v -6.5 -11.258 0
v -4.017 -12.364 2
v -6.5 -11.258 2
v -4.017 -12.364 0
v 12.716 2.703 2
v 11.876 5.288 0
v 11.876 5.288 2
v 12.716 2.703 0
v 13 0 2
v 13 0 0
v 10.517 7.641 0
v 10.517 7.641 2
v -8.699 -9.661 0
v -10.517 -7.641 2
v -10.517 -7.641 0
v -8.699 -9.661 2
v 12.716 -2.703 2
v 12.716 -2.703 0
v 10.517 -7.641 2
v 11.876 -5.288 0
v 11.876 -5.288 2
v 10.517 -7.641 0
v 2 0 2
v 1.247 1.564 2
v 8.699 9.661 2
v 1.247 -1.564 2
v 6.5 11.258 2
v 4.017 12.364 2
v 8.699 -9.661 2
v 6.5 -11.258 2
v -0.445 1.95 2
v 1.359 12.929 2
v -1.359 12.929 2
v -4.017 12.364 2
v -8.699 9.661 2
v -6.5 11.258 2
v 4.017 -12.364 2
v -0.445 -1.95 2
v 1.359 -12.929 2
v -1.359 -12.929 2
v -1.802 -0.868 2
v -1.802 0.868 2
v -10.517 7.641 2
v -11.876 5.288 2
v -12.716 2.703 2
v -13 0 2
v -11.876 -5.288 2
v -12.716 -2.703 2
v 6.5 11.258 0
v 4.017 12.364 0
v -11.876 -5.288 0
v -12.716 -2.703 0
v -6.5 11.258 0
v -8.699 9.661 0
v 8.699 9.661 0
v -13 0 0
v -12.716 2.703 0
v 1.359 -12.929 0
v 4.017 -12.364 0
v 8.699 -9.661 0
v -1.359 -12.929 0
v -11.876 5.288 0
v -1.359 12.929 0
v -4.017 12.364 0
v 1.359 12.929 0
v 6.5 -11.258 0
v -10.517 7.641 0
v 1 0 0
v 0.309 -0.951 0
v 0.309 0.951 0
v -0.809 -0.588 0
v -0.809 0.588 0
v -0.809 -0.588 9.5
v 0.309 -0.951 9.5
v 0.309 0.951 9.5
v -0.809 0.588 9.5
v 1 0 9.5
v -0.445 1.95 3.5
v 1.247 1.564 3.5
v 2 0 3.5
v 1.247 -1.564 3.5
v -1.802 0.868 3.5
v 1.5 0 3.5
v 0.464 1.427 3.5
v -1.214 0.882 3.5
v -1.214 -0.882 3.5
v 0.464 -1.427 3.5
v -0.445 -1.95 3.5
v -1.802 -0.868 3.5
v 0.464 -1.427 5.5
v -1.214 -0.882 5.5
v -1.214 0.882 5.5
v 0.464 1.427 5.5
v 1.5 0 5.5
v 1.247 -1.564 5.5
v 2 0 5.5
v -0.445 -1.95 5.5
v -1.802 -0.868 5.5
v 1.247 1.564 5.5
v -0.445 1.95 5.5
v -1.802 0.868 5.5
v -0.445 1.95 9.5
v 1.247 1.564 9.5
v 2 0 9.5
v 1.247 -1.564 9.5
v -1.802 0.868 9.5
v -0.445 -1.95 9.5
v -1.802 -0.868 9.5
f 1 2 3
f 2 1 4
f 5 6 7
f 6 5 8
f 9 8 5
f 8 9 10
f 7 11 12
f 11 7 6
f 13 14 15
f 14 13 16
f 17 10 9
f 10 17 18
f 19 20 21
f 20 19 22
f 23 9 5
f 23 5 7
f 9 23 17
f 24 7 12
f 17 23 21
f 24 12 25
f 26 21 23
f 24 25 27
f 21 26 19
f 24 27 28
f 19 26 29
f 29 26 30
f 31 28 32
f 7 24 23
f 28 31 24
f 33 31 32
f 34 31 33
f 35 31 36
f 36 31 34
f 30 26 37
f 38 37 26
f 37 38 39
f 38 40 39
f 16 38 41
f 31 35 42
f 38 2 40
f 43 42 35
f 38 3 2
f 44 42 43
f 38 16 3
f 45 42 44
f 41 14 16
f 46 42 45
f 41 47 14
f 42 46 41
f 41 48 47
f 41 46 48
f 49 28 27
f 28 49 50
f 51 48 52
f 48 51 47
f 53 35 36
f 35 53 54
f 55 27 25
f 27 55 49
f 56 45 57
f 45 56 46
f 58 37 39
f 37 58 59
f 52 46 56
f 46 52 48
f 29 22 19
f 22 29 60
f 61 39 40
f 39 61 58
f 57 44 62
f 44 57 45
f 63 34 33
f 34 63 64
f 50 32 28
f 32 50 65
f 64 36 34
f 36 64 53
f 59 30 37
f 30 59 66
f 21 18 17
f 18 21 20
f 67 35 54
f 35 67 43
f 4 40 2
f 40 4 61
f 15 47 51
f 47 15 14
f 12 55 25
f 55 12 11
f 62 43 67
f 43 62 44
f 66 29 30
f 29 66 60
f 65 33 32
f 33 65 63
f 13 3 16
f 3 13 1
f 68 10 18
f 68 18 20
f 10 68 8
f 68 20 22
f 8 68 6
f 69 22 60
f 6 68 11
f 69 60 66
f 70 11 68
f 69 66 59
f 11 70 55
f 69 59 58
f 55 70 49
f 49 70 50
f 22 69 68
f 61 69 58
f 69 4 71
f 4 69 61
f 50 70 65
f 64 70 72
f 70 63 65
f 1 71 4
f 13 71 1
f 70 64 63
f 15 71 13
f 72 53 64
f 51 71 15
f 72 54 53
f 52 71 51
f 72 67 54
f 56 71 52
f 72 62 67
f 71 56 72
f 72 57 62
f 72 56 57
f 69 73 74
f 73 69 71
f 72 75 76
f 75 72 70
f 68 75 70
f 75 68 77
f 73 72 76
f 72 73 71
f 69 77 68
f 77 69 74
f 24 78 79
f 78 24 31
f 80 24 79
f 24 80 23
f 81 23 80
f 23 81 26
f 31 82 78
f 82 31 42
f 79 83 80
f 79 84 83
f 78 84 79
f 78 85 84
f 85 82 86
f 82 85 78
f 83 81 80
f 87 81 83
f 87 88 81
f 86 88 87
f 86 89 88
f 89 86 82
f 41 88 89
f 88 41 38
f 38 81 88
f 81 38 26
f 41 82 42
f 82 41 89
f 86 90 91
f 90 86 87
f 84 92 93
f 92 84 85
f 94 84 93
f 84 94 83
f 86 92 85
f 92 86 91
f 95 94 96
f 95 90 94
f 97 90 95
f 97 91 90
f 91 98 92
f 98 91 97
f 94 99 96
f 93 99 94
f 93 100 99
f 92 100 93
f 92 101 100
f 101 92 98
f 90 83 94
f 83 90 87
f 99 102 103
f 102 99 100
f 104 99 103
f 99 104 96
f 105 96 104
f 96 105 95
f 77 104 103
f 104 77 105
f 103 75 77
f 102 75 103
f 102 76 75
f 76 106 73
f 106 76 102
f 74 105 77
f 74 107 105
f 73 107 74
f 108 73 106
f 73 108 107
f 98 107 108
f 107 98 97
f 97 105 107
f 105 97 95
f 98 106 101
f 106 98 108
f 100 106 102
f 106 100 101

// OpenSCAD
// -----------------------------------------------------------------------------
// Module: pipe
// -----------------------------------------------------------------------------
module pipe(R, r, L) {
    difference() {
        cylinder(h = L, r = R);
        translate([0, 0, -1])
        cylinder(h = L + 2, r = r);
    }
}

outer_r = 145;
inner_r = 140;

thickness = outer_r - inner_r; 
//gap = 0.1;
chink = inner_r * 2 /13 ;

// Piston specs
head_r = inner_r; // - gap; // Slight clearance
head_l = 2 * chink;
stroke = head_l;
axe = 4 * chink; // roulement a bille horisontale (2) + 1 unité de chaque coté
bielle_l = stroke * 2 + axe;

//cylinder_height = 60;

// -----------------------------------------------------------------------------
// Module: Half-Open Cylinder with Offset Wall
// -----------------------------------------------------------------------------
module half_open_cylinder(height, outer_r, inner_r) {
    translate_z = thickness; 
    difference() {
        cylinder(h = height, r = outer_r);
        translate([0, 0, translate_z]);
        cylinder(h = height, r = inner_r);
        
    }
}


// Base module defining dimensions relative to chink
module manson_13_base(chink) {
    head_r = 13 * chink;	
    head_l = 2 * chink;
    rod_l_head = (2 - 0.5) * chink;		
    neck_l = 2 * chink;
    neck_r = 1.5 * chink;
    rod_l_tail = 4 * chink;
    rod_r = 2 * chink;

    translate([0, 0, 0])
    pipe(head_r, chink, head_l);
    translate([0, 0, head_l])
    pipe(rod_r, chink, rod_l_head);
    translate([0, 0, head_l + rod_l_head])
    pipe(neck_r, chink, rod_l_tail);
    rod_z_start = head_l + rod_l_head + neck_l;
    translate([0, 0, rod_z_start])
    pipe(rod_r, chink, rod_l_tail);
}

// Base module defining dimensions relative to chink
module manson_13_base(chink) {
    head_r = 13 * chink;
    head_l = 2 * chink;
    rod_l_head = (2 - 0.5) * chink;
    neck_l = 2 * chink;
    neck_r = 1.5 * chink;
    rod_l_tail = 4 * chink;
    rod_r = 2 * chink;

    translate([0, 0, 0])
    pipe(head_r, chink, head_l);
    translate([0, 0, head_l])
    pipe(rod_r, chink, rod_l_head);
    translate([0, 0, head_l + rod_l_head])
    pipe(neck_r, chink, neck_l);
    rod_z_start = head_l + rod_l_head + neck_l;
    translate([0, 0, rod_z_start])
    pipe(rod_r, chink, rod_l_tail);
}

// Module pour l'axe perpendiculaire
module cylinder_axis(chink) {
    axis_r = chink; // Rayon = chink (Diamètre = 2 * chink)
    axis_l = 2 * chink; // Longueur de l'axe
    
    // Calcul de la position Z demandée
    // Note: rod_z_start doit être recalculé ici car il est local au module base
    head_l = 2 * chink;
    rod_l_head = (2 - 0.5) * chink;
    neck_l = 2 * chink;
    rod_z_start = head_l + rod_l_head + neck_l;
    
    translate([0, 0, rod_z_start + chink])
    rotate([90, 0, 0]) // Rotation pour être perpendiculaire (aligné sur Y)
    cylinder(r=axis_r, h=axis_l, center=true); // center=true pour centrer sur le point de translation
}

// -----------------------------------------------------------------------------
// Scene Assembly
// -----------------------------------------------------------------------------

// Color: Semi-transparent Grey for cylinder
color([0.9, 0.6, 0.1, 0.9]) {
    manson_13_base(1); // Exemple avec chink = 1
    //cylinder_axis(1);
}
